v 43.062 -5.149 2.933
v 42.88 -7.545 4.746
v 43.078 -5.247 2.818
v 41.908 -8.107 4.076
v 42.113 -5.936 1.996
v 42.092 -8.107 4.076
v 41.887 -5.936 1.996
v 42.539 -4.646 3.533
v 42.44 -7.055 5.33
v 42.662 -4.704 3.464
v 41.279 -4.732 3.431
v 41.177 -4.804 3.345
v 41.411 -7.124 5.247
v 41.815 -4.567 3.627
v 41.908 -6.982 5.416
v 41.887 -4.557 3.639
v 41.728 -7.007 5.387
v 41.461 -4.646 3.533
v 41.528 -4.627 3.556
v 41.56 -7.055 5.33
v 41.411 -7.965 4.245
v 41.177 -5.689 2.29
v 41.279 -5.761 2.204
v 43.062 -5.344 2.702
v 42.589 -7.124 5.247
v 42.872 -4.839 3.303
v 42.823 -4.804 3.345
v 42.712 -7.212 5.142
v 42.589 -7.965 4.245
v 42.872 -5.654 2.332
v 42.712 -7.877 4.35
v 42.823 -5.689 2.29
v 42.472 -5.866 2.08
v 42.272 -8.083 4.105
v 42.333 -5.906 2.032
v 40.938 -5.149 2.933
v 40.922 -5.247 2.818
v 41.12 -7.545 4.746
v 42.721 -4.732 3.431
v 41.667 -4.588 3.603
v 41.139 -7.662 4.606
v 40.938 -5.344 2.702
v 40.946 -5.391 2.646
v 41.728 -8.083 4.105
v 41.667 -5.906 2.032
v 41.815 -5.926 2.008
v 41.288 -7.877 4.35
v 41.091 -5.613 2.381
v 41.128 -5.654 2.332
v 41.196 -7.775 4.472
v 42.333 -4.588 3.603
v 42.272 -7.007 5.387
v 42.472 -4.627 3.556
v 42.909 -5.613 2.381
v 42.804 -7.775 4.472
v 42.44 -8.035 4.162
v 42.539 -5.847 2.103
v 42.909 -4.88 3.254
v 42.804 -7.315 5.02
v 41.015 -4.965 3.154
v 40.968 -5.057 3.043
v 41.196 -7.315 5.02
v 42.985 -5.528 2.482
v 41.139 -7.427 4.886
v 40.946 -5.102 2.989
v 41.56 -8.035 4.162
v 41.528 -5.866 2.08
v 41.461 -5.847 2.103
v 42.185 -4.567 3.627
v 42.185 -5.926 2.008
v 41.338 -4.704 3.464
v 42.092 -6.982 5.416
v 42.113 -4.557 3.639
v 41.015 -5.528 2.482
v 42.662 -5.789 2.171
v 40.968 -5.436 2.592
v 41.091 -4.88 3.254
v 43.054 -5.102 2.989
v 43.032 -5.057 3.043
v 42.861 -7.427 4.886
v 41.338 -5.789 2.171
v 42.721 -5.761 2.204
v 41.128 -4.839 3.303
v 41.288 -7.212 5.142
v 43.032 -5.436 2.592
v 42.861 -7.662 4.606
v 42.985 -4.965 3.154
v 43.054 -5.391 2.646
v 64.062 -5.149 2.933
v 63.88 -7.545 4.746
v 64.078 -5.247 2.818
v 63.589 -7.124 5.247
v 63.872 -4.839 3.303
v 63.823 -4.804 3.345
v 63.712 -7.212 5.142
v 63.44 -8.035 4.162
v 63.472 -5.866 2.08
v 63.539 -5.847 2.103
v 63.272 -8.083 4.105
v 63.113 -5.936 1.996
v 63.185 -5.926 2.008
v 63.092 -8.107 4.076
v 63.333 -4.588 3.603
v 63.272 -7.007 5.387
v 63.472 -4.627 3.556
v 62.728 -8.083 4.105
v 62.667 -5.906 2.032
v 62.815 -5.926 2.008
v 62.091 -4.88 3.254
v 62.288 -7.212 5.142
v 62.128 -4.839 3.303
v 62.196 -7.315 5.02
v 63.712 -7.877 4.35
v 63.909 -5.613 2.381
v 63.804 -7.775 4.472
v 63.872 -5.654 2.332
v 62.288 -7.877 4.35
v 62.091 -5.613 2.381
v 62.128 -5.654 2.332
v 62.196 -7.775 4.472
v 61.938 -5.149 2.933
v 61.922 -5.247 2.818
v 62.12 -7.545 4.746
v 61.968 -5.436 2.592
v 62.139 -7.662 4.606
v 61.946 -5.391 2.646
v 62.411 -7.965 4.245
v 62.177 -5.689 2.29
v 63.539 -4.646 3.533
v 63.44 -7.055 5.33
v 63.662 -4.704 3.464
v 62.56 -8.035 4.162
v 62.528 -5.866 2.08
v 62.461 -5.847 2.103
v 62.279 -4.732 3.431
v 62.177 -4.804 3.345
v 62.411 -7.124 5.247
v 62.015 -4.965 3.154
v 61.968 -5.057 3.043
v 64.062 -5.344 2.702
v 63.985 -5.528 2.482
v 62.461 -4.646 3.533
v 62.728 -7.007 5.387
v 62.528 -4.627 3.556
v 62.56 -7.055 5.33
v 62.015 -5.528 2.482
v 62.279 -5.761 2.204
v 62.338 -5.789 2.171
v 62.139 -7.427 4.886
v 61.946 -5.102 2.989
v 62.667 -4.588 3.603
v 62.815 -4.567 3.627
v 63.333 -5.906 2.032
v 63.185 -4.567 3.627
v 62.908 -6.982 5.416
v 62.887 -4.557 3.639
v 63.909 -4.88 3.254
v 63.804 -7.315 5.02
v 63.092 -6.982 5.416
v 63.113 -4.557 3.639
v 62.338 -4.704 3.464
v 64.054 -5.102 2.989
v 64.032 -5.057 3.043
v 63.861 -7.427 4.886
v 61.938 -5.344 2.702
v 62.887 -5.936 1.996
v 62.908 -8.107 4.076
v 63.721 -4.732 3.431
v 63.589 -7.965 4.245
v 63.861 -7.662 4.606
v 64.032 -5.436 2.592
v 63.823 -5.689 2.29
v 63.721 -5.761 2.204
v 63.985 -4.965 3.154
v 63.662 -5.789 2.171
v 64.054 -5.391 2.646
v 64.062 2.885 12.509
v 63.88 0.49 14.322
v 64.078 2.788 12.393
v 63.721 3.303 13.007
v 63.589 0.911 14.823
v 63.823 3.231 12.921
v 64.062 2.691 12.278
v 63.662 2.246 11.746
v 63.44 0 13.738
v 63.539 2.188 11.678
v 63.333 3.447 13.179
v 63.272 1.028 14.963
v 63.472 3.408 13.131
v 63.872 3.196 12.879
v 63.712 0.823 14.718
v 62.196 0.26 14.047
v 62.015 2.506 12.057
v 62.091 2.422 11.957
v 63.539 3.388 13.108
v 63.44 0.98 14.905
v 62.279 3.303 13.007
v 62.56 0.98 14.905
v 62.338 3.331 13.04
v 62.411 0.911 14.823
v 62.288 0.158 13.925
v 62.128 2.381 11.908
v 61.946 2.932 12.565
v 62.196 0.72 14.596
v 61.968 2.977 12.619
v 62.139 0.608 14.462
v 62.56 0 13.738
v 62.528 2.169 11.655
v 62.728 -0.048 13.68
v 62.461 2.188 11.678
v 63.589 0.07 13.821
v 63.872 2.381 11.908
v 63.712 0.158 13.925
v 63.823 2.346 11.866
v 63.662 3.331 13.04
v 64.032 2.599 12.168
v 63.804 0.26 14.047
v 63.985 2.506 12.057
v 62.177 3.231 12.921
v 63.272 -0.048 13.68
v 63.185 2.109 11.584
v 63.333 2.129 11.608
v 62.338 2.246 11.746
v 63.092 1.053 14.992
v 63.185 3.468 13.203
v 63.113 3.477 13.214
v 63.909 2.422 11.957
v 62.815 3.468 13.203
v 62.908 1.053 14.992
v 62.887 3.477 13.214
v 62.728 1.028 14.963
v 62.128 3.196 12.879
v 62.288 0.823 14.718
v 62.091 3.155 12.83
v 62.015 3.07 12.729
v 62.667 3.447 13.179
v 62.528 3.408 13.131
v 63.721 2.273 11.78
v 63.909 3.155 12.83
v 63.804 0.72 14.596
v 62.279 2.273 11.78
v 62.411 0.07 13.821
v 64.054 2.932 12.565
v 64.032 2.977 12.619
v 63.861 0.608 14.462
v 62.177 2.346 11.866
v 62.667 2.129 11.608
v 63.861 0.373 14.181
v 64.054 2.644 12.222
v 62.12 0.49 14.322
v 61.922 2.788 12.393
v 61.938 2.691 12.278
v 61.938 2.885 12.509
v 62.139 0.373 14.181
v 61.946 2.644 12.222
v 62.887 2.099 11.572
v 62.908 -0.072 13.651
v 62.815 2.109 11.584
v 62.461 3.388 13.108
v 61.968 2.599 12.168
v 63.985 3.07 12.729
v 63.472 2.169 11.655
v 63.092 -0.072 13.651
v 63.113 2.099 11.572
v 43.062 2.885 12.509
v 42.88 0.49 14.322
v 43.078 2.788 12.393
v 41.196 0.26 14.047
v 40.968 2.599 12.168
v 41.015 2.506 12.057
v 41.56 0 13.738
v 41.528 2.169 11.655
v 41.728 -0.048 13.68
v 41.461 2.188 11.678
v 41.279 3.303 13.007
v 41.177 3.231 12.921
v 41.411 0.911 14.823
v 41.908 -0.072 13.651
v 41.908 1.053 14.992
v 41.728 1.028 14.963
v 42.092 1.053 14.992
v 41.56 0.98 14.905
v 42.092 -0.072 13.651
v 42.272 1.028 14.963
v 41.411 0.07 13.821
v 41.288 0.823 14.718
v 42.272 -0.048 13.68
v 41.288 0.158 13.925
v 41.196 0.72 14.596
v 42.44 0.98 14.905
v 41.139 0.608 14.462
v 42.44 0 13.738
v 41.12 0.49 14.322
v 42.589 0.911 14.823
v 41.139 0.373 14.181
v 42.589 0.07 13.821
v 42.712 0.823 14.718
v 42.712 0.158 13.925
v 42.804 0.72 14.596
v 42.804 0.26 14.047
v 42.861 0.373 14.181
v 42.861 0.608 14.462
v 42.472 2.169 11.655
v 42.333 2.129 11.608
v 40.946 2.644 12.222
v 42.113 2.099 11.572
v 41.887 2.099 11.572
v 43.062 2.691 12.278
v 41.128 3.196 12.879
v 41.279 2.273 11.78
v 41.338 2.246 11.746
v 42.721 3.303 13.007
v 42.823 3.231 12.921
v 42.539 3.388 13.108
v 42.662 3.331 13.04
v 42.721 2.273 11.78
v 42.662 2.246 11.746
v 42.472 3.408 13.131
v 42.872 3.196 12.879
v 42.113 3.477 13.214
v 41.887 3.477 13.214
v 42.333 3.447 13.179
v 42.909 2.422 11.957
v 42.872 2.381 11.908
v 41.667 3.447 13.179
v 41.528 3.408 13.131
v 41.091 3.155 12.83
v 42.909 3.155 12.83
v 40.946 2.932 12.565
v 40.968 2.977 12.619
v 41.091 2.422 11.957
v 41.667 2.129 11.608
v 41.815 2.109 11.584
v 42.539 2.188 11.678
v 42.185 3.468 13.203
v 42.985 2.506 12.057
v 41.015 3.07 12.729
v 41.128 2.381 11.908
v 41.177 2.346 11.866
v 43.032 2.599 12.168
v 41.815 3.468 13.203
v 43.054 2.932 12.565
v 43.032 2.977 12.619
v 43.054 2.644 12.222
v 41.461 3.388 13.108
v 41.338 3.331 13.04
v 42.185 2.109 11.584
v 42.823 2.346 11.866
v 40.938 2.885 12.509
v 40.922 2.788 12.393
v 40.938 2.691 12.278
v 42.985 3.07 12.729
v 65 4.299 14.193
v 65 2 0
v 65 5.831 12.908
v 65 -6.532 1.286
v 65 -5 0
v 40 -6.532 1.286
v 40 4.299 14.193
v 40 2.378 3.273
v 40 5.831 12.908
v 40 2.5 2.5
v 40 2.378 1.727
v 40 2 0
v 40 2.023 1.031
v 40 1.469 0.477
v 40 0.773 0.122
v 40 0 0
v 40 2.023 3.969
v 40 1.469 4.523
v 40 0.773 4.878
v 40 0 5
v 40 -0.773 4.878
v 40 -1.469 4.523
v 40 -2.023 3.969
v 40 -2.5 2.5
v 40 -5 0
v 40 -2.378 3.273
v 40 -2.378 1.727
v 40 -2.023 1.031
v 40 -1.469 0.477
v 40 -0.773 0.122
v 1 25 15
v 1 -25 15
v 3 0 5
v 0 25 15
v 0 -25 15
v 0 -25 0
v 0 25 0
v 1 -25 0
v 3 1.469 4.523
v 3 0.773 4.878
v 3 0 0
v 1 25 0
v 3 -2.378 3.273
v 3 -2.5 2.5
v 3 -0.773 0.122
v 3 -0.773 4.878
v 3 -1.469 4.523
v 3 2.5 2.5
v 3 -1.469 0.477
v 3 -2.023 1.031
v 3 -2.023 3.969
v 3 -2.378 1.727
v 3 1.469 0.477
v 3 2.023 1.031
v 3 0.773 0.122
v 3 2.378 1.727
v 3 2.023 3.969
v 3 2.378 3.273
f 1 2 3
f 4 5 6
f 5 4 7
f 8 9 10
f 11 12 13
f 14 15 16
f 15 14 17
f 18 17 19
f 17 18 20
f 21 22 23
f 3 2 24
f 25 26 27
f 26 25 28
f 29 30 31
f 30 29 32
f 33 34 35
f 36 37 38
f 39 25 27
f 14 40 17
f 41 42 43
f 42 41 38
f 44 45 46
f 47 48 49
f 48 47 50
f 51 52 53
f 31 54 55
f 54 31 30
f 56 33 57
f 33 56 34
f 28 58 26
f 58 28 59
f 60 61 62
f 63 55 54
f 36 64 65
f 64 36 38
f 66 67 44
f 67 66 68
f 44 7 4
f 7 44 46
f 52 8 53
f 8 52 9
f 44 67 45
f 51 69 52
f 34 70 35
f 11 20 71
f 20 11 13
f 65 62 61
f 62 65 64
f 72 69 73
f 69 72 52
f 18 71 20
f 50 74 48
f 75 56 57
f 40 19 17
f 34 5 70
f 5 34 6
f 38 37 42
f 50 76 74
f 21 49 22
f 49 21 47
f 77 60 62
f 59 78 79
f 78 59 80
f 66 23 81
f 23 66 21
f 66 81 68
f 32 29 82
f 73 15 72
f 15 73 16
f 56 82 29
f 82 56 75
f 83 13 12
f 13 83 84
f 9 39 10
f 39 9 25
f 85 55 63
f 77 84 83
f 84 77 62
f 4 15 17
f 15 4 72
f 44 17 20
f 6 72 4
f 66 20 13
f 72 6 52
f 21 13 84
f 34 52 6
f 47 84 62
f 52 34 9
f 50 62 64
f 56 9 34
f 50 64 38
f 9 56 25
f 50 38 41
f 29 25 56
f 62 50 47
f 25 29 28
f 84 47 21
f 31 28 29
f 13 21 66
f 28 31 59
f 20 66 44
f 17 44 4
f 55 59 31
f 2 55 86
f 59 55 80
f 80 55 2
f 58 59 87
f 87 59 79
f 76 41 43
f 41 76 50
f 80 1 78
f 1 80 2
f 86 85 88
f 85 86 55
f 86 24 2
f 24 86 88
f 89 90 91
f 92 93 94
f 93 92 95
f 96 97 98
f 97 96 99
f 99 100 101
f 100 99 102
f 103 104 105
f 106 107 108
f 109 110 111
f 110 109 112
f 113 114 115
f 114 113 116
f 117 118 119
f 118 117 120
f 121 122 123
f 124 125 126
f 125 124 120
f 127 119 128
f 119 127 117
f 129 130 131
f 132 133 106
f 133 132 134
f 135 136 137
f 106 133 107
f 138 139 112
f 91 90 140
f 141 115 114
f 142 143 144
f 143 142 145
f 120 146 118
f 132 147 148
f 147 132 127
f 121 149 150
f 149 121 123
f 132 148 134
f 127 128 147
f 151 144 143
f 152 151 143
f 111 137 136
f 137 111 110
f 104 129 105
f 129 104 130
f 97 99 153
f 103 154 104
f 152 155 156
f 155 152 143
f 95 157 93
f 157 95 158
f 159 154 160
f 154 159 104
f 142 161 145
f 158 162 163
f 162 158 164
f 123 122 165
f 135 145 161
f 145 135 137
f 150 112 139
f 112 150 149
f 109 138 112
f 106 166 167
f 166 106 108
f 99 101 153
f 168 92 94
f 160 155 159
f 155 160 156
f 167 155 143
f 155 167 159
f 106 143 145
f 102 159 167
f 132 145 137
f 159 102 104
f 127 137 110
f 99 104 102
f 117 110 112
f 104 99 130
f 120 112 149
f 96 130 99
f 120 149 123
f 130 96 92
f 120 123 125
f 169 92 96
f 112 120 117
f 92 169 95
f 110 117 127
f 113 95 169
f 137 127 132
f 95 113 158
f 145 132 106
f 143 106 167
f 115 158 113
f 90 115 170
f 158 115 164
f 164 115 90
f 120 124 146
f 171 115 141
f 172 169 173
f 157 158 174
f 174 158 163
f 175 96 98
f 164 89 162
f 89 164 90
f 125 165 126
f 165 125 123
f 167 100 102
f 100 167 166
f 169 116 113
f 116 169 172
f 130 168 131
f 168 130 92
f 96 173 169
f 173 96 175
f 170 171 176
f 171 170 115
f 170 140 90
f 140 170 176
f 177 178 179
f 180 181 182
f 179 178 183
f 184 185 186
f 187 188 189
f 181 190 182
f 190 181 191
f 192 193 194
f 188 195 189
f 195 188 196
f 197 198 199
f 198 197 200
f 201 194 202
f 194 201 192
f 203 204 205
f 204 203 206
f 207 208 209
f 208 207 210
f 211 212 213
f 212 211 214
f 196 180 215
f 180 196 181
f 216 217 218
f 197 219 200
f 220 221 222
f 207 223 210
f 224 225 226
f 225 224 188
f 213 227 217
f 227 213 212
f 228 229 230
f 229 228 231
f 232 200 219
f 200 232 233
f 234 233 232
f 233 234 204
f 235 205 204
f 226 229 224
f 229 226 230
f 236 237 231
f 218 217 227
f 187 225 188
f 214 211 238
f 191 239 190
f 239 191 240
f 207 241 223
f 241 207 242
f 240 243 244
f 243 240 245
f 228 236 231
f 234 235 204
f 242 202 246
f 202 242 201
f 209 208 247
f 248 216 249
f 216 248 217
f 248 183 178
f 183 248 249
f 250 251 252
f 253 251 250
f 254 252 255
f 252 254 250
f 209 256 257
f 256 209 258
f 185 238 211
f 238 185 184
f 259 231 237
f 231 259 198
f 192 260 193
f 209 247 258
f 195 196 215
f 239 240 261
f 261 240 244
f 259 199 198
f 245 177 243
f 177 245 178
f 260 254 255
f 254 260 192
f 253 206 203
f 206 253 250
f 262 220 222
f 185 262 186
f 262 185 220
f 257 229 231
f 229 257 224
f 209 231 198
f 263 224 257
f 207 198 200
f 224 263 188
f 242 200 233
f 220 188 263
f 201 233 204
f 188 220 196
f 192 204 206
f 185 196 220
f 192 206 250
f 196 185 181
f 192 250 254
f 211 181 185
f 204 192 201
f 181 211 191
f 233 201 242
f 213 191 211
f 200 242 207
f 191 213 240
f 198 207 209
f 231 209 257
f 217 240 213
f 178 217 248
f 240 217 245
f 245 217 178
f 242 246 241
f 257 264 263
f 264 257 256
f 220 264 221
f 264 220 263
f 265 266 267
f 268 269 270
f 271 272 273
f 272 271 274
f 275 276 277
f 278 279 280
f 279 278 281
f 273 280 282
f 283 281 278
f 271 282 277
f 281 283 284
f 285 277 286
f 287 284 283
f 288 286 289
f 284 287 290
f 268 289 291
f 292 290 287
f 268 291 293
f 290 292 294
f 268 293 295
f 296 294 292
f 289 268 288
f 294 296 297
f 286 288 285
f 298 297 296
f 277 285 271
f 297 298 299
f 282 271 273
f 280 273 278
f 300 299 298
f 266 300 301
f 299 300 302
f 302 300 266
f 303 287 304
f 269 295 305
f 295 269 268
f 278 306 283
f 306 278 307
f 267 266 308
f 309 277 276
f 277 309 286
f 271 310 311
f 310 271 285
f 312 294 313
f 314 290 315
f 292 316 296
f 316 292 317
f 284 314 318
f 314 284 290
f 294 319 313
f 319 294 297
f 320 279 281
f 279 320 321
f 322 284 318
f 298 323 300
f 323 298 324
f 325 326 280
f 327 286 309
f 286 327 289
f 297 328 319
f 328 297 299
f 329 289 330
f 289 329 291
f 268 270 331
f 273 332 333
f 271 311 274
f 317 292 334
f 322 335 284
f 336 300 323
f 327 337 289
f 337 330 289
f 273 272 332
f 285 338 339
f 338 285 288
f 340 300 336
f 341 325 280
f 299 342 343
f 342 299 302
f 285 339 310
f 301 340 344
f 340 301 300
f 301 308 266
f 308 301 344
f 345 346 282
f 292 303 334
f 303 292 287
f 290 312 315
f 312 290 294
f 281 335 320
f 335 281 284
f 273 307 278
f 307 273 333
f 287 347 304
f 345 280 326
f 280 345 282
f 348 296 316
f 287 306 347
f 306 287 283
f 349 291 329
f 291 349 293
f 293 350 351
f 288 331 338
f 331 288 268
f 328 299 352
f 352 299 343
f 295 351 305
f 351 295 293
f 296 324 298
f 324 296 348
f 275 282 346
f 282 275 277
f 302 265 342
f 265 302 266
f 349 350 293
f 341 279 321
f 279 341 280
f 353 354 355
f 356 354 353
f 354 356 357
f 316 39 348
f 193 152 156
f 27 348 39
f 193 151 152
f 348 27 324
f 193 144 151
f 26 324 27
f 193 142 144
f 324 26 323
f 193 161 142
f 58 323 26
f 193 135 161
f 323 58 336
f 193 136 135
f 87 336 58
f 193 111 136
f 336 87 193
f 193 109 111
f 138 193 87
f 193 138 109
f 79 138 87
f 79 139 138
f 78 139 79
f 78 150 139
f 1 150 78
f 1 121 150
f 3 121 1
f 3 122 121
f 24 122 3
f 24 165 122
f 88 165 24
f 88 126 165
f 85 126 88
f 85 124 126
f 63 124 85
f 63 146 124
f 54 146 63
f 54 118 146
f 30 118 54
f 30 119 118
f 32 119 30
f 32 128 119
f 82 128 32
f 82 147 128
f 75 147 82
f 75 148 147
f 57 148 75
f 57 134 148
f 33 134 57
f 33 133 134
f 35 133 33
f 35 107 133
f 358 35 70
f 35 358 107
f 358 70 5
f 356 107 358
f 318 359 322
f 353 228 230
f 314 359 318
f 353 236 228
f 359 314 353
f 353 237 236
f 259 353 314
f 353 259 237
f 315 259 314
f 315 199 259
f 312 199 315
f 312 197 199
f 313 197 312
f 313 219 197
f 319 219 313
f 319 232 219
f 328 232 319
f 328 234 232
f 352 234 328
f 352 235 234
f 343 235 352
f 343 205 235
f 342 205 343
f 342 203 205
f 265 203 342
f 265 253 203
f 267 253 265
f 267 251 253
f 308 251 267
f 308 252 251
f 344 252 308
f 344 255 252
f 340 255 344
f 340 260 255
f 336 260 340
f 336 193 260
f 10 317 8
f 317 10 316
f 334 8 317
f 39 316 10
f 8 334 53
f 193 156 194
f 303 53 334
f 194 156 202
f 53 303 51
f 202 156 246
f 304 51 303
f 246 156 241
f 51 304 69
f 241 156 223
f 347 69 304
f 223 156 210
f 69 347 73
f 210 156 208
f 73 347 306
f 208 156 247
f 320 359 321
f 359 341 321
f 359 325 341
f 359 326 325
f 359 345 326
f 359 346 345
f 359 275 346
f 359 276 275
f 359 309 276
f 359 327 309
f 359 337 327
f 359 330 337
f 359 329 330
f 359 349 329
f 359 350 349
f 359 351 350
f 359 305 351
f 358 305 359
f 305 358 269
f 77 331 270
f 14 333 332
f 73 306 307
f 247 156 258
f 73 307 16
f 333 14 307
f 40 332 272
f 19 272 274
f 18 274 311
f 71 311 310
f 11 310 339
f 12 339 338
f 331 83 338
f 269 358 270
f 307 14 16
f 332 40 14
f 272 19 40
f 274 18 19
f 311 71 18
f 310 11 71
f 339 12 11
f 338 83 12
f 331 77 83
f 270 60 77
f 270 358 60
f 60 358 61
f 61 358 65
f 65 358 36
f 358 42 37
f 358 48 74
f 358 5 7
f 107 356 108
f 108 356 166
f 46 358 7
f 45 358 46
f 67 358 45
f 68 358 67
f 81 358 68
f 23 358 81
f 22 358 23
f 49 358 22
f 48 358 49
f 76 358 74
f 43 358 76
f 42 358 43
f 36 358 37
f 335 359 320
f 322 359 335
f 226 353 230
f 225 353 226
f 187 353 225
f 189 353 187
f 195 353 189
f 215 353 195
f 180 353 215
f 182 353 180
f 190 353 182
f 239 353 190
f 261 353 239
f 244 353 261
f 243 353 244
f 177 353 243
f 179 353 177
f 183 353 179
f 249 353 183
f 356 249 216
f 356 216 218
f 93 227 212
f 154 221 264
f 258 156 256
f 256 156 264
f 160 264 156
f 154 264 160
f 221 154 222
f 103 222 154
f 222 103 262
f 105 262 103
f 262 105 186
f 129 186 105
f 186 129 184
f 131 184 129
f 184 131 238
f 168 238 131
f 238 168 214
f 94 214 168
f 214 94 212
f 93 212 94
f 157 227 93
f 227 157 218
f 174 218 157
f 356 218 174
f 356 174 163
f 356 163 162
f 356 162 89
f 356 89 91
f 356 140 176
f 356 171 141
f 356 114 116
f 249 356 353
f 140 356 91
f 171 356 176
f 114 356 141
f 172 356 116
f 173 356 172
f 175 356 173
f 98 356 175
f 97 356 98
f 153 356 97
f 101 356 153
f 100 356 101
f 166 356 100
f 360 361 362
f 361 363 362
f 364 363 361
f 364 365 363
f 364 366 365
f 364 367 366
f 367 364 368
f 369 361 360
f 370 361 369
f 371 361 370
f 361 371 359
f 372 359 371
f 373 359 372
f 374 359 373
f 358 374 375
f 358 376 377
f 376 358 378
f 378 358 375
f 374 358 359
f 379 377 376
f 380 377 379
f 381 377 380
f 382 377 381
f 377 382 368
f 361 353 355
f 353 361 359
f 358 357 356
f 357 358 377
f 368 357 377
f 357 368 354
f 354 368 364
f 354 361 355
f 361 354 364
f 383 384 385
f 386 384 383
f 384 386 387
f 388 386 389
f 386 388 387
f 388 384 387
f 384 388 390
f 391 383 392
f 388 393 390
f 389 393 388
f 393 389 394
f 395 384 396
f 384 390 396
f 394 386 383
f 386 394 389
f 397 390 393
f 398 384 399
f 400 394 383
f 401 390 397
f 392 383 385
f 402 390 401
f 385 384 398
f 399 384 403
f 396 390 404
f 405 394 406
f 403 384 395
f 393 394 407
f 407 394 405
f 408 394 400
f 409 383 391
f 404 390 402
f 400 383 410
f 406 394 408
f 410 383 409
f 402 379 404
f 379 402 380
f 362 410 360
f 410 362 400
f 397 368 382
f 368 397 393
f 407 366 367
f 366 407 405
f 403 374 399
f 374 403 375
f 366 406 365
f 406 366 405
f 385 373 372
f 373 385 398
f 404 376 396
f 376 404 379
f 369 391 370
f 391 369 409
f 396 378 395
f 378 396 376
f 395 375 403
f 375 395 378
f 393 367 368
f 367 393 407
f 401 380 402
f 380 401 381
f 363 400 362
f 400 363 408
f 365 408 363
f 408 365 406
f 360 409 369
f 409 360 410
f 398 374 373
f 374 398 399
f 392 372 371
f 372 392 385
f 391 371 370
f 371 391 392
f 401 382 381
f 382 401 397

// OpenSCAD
$fn=20;
/*
  Adhesive Raspberry Pi Camera v2.1 mount (OpenSCAD)
  Author: Brian Khuu (2019)
  
  This is a pressfit design. No support required. Just print and push the camera PCB to the mounting holes.
  
  Apply adhesive strip
  
  Default value assumes: Command Strip dimentions is typically 50mmx15mm

*/

/* [Camera]  */

// Camera Tilt Angle
picam_tilt_angle = 50;

// Offset Length
picam_mount_offset = 40;

/* [Mounting Strip Base]  */

// length of mounting strip base
sx = 50 ; 

// widith of mounting strip base
sy = 15 ;

// height of mounting strip base
sh = 2  ;

module rpi_camera_model() {
  // ==============================================
  // Model of Raspberry Pi Camera v2.1
  // J.Beale 14-May-2016
  // ==============================================
  
  xs = 25.0;  // width of PCB
  ys = 23.85;  // height of PCB
  zs = 0.95;  // thickness of bare PCB, not including soldermask
  smt = 0.05;  // soldermask thickness (on each side)

  ID1 = 2.20; // ID of mounting through-holes
  OD1 = 4.7;  // silkscreen clearance around hole

  mhxc = 21.0;  // X center-to-center separation of mounting holes
  mhyc = 12.5; // Y center-to-center separation of mtng. holes
  mhox = 2.0;  // X mounting hole corner offset
  mhoy = 2.0;  // Y mounting hole corner offset
  hh = zs*2; // depth/height of mounting hole (subtractive cylinder)

  smx = 8.45;  // camera sensor module, base part
  smy = 8.45;
  smz = 2.3;
  smbod = 7.25;  // OD of lens holder barrel
  smbz = 1.7; // z-height of lens holder barrel
  smcod = 5.6;  // OD of lens cell 
  smcz = 0.6;  // protrusion of cell above holder barrel
  smcid = 1.55;  // optical aperture: opening for lens

  smfx = 8.9; // flex connector width
  smfy = 4.5; // flex connector 
  smfz = 1.52; // flex connector
  smfox = 9.45; // flex edge X offset
  smfoy = 2.6; // flex edge Y offset
  smfcx = 7.2; // flex cable width

  fcy = 5.8; // 15-way flex connector
  fcx = 21.0; // 15-way flex connector
  fcz = 3.77-1.15; // 15-way flex connector height  
  fcyoff = 0.3; // connector offset from PCB edge

  ffx = 16.05;  // 15-way flex cable width
  ffy = 30;  // length of flex cable stub
  ffz = 0.38;  // thickness of ff cable at stiffener
  ffoz = 1.1; // offset of ff cable below PCB

  KOx = 22.15; // keepout width- full
  KOxa = 15.1; // keepout width- inner block
  KOz = 1.35; // bottom side keepout z-height
  KOyo = 1.15; // keepout edge offset

  fn=40;  // facets on cylinder
  eps=0.03; // small number

  module pcb() {
  difference() {
   union() {
       translate([0,0,0]) color("green") 
          cube([xs,ys,smt]); // soldermask (bottom)
       translate([0,0,smt]) color("yellow") 
          cube([xs,ys,zs]); // natural PCB color
       translate([0,0,zs]) color("green") 
          cube([xs,ys,smt]); // soldermask (top)
   }
   translate([mhox,mhoy,zs-(smt+eps)]) {  // mask clearance: top
       cylinder(d=OD1,h=zs,$fn=fn);
       translate([mhxc,0,0]) cylinder(d=OD1,h=zs,$fn=fn);
       translate([mhxc,mhyc,0]) cylinder(d=OD1,h=zs,$fn=fn);
       translate([0,mhyc,0]) cylinder(d=OD1,h=zs,$fn=fn);
   }
   translate([mhox,mhoy,-eps]) {  // mask clearance: bottom
       cylinder(d=OD1,h=smt,$fn=fn);
       translate([mhxc,0,0]) cylinder(d=OD1,h=smt,$fn=fn);
       translate([mhxc,mhyc,0]) cylinder(d=OD1,h=smt,$fn=fn);
       translate([0,mhyc,0]) cylinder(d=OD1,h=smt,$fn=fn);
   }
   translate([mhox,mhoy,-zs*5]) {  // through holes
    cylinder(d=ID1,h=zs*10,$fn=fn);     
    translate([mhxc,0,0])  cylinder(d=ID1,h=zs*10,$fn=fn);
    translate([mhxc,mhyc,0])  cylinder(d=ID1,h=zs*10,$fn=fn);
    translate([0,mhyc,0])  cylinder(d=ID1,h=zs*10,$fn=fn);
    }
   }
  }
  
  module sensor() { // Camera sensor module
   color([.25,.25,.25]) translate([-smx/2, -smy/2, 0]) cube([smx,smy,smz]);
   color([.3,.3,.3]) cylinder(d=smbod, h=smbz + smz, $fn=fn);
   difference() {
    color([.2,.2,.2]) cylinder(d=smcod, h=smbz + smz + smcz, $fn=fn);
    translate([0,0,smcz]) cylinder(d=smcid, h=smbz + smz + smcz, $fn=fn);
   }
  }

  module flex() { // micro-flex attached to sensor
   color([0.2,0.20,0.18]) cube([smfx,smfy,smfz]); // u-flex connector top
   translate([0,smfy,0]) color([0.33,0.33,0.23]) cube([smfcx,smfy,smfz-.1]);
  }

  module fcon() {  // micro-flex connector to PCB
      color([0.6,0.20,0.18]) cube([fcx,fcy,fcz]);
  }

  module ff15() {  // 15-conductor flat flex cable
      color([.7,.7,.7]) cube([ffx,ffy,ffz]);
  }
  
  translate([xs/2 ,mhyc+mhoy,zs]) sensor();
  translate([smfox,smfoy,zs]) flex(); // micro-flex on sensor
  pcb();
}

module cam_holder(thickness, rotate, hull_base)
{
  fn=30;
  pressfit_h=5;
  
  // Simulated Camera
  %rotate([rotate,0,0])translate([0 ,0,thickness+1]) rpi_camera_model();
  
  xs = 25.0;  // width of PCB
  ys = 23.85-7;  // height of PCB
  zs = 0.95;  // thickness of bare PCB, not including soldermask

  mhxc = 21.0;  // X center-to-center separation of mounting holes
  mhyc = 12.5; // Y center-to-center separation of mtng. holes
  mhox = 2.0;  // X mounting hole corner offset
  mhoy = 2.0;  // Y mounting hole corner offset
  ID1 = 2.20; // ID of mounting through-holes
  
  if(hull_base>0)
  hull()
  {
    rotate([rotate,0,0])
      cube([xs,ys,0.1]);
    cube([xs,hull_base,0.1]);
  }

  rotate([rotate,0,0])
  {
   cube([xs,ys,thickness]);
   translate([mhox,mhoy,0]) 
   {  // through holes
      translate([0,0,0])        cylinder(d1=ID1*1.1,d2=ID1*0.8,h=pressfit_h,$fn=fn);     
      translate([mhxc,0,0])     cylinder(d1=ID1*1.1,d2=ID1*0.8,h=pressfit_h,$fn=fn);
      translate([mhxc,mhyc,0])  cylinder(d1=ID1*1.1,d2=ID1*0.8,h=pressfit_h,$fn=fn);
      translate([0,mhyc,0])     cylinder(d1=ID1*1.1,d2=ID1*0.8,h=pressfit_h,$fn=fn);
   }
 }
}

union()
{
  hull()
  {
    translate([0,-sx/2,0])
      cube([1,sx,sy]);
    translate([0,0,5/2])
      rotate([0,90,0])
      cylinder(r=5/2,h=3);
  }

  translate([0,0,5/2])
    rotate([0,90,0])
      cylinder(r=5/2,h=picam_mount_offset);
  
  translate([picam_mount_offset,-5,0])
    cam_holder(2, picam_tilt_angle, 7);
}
